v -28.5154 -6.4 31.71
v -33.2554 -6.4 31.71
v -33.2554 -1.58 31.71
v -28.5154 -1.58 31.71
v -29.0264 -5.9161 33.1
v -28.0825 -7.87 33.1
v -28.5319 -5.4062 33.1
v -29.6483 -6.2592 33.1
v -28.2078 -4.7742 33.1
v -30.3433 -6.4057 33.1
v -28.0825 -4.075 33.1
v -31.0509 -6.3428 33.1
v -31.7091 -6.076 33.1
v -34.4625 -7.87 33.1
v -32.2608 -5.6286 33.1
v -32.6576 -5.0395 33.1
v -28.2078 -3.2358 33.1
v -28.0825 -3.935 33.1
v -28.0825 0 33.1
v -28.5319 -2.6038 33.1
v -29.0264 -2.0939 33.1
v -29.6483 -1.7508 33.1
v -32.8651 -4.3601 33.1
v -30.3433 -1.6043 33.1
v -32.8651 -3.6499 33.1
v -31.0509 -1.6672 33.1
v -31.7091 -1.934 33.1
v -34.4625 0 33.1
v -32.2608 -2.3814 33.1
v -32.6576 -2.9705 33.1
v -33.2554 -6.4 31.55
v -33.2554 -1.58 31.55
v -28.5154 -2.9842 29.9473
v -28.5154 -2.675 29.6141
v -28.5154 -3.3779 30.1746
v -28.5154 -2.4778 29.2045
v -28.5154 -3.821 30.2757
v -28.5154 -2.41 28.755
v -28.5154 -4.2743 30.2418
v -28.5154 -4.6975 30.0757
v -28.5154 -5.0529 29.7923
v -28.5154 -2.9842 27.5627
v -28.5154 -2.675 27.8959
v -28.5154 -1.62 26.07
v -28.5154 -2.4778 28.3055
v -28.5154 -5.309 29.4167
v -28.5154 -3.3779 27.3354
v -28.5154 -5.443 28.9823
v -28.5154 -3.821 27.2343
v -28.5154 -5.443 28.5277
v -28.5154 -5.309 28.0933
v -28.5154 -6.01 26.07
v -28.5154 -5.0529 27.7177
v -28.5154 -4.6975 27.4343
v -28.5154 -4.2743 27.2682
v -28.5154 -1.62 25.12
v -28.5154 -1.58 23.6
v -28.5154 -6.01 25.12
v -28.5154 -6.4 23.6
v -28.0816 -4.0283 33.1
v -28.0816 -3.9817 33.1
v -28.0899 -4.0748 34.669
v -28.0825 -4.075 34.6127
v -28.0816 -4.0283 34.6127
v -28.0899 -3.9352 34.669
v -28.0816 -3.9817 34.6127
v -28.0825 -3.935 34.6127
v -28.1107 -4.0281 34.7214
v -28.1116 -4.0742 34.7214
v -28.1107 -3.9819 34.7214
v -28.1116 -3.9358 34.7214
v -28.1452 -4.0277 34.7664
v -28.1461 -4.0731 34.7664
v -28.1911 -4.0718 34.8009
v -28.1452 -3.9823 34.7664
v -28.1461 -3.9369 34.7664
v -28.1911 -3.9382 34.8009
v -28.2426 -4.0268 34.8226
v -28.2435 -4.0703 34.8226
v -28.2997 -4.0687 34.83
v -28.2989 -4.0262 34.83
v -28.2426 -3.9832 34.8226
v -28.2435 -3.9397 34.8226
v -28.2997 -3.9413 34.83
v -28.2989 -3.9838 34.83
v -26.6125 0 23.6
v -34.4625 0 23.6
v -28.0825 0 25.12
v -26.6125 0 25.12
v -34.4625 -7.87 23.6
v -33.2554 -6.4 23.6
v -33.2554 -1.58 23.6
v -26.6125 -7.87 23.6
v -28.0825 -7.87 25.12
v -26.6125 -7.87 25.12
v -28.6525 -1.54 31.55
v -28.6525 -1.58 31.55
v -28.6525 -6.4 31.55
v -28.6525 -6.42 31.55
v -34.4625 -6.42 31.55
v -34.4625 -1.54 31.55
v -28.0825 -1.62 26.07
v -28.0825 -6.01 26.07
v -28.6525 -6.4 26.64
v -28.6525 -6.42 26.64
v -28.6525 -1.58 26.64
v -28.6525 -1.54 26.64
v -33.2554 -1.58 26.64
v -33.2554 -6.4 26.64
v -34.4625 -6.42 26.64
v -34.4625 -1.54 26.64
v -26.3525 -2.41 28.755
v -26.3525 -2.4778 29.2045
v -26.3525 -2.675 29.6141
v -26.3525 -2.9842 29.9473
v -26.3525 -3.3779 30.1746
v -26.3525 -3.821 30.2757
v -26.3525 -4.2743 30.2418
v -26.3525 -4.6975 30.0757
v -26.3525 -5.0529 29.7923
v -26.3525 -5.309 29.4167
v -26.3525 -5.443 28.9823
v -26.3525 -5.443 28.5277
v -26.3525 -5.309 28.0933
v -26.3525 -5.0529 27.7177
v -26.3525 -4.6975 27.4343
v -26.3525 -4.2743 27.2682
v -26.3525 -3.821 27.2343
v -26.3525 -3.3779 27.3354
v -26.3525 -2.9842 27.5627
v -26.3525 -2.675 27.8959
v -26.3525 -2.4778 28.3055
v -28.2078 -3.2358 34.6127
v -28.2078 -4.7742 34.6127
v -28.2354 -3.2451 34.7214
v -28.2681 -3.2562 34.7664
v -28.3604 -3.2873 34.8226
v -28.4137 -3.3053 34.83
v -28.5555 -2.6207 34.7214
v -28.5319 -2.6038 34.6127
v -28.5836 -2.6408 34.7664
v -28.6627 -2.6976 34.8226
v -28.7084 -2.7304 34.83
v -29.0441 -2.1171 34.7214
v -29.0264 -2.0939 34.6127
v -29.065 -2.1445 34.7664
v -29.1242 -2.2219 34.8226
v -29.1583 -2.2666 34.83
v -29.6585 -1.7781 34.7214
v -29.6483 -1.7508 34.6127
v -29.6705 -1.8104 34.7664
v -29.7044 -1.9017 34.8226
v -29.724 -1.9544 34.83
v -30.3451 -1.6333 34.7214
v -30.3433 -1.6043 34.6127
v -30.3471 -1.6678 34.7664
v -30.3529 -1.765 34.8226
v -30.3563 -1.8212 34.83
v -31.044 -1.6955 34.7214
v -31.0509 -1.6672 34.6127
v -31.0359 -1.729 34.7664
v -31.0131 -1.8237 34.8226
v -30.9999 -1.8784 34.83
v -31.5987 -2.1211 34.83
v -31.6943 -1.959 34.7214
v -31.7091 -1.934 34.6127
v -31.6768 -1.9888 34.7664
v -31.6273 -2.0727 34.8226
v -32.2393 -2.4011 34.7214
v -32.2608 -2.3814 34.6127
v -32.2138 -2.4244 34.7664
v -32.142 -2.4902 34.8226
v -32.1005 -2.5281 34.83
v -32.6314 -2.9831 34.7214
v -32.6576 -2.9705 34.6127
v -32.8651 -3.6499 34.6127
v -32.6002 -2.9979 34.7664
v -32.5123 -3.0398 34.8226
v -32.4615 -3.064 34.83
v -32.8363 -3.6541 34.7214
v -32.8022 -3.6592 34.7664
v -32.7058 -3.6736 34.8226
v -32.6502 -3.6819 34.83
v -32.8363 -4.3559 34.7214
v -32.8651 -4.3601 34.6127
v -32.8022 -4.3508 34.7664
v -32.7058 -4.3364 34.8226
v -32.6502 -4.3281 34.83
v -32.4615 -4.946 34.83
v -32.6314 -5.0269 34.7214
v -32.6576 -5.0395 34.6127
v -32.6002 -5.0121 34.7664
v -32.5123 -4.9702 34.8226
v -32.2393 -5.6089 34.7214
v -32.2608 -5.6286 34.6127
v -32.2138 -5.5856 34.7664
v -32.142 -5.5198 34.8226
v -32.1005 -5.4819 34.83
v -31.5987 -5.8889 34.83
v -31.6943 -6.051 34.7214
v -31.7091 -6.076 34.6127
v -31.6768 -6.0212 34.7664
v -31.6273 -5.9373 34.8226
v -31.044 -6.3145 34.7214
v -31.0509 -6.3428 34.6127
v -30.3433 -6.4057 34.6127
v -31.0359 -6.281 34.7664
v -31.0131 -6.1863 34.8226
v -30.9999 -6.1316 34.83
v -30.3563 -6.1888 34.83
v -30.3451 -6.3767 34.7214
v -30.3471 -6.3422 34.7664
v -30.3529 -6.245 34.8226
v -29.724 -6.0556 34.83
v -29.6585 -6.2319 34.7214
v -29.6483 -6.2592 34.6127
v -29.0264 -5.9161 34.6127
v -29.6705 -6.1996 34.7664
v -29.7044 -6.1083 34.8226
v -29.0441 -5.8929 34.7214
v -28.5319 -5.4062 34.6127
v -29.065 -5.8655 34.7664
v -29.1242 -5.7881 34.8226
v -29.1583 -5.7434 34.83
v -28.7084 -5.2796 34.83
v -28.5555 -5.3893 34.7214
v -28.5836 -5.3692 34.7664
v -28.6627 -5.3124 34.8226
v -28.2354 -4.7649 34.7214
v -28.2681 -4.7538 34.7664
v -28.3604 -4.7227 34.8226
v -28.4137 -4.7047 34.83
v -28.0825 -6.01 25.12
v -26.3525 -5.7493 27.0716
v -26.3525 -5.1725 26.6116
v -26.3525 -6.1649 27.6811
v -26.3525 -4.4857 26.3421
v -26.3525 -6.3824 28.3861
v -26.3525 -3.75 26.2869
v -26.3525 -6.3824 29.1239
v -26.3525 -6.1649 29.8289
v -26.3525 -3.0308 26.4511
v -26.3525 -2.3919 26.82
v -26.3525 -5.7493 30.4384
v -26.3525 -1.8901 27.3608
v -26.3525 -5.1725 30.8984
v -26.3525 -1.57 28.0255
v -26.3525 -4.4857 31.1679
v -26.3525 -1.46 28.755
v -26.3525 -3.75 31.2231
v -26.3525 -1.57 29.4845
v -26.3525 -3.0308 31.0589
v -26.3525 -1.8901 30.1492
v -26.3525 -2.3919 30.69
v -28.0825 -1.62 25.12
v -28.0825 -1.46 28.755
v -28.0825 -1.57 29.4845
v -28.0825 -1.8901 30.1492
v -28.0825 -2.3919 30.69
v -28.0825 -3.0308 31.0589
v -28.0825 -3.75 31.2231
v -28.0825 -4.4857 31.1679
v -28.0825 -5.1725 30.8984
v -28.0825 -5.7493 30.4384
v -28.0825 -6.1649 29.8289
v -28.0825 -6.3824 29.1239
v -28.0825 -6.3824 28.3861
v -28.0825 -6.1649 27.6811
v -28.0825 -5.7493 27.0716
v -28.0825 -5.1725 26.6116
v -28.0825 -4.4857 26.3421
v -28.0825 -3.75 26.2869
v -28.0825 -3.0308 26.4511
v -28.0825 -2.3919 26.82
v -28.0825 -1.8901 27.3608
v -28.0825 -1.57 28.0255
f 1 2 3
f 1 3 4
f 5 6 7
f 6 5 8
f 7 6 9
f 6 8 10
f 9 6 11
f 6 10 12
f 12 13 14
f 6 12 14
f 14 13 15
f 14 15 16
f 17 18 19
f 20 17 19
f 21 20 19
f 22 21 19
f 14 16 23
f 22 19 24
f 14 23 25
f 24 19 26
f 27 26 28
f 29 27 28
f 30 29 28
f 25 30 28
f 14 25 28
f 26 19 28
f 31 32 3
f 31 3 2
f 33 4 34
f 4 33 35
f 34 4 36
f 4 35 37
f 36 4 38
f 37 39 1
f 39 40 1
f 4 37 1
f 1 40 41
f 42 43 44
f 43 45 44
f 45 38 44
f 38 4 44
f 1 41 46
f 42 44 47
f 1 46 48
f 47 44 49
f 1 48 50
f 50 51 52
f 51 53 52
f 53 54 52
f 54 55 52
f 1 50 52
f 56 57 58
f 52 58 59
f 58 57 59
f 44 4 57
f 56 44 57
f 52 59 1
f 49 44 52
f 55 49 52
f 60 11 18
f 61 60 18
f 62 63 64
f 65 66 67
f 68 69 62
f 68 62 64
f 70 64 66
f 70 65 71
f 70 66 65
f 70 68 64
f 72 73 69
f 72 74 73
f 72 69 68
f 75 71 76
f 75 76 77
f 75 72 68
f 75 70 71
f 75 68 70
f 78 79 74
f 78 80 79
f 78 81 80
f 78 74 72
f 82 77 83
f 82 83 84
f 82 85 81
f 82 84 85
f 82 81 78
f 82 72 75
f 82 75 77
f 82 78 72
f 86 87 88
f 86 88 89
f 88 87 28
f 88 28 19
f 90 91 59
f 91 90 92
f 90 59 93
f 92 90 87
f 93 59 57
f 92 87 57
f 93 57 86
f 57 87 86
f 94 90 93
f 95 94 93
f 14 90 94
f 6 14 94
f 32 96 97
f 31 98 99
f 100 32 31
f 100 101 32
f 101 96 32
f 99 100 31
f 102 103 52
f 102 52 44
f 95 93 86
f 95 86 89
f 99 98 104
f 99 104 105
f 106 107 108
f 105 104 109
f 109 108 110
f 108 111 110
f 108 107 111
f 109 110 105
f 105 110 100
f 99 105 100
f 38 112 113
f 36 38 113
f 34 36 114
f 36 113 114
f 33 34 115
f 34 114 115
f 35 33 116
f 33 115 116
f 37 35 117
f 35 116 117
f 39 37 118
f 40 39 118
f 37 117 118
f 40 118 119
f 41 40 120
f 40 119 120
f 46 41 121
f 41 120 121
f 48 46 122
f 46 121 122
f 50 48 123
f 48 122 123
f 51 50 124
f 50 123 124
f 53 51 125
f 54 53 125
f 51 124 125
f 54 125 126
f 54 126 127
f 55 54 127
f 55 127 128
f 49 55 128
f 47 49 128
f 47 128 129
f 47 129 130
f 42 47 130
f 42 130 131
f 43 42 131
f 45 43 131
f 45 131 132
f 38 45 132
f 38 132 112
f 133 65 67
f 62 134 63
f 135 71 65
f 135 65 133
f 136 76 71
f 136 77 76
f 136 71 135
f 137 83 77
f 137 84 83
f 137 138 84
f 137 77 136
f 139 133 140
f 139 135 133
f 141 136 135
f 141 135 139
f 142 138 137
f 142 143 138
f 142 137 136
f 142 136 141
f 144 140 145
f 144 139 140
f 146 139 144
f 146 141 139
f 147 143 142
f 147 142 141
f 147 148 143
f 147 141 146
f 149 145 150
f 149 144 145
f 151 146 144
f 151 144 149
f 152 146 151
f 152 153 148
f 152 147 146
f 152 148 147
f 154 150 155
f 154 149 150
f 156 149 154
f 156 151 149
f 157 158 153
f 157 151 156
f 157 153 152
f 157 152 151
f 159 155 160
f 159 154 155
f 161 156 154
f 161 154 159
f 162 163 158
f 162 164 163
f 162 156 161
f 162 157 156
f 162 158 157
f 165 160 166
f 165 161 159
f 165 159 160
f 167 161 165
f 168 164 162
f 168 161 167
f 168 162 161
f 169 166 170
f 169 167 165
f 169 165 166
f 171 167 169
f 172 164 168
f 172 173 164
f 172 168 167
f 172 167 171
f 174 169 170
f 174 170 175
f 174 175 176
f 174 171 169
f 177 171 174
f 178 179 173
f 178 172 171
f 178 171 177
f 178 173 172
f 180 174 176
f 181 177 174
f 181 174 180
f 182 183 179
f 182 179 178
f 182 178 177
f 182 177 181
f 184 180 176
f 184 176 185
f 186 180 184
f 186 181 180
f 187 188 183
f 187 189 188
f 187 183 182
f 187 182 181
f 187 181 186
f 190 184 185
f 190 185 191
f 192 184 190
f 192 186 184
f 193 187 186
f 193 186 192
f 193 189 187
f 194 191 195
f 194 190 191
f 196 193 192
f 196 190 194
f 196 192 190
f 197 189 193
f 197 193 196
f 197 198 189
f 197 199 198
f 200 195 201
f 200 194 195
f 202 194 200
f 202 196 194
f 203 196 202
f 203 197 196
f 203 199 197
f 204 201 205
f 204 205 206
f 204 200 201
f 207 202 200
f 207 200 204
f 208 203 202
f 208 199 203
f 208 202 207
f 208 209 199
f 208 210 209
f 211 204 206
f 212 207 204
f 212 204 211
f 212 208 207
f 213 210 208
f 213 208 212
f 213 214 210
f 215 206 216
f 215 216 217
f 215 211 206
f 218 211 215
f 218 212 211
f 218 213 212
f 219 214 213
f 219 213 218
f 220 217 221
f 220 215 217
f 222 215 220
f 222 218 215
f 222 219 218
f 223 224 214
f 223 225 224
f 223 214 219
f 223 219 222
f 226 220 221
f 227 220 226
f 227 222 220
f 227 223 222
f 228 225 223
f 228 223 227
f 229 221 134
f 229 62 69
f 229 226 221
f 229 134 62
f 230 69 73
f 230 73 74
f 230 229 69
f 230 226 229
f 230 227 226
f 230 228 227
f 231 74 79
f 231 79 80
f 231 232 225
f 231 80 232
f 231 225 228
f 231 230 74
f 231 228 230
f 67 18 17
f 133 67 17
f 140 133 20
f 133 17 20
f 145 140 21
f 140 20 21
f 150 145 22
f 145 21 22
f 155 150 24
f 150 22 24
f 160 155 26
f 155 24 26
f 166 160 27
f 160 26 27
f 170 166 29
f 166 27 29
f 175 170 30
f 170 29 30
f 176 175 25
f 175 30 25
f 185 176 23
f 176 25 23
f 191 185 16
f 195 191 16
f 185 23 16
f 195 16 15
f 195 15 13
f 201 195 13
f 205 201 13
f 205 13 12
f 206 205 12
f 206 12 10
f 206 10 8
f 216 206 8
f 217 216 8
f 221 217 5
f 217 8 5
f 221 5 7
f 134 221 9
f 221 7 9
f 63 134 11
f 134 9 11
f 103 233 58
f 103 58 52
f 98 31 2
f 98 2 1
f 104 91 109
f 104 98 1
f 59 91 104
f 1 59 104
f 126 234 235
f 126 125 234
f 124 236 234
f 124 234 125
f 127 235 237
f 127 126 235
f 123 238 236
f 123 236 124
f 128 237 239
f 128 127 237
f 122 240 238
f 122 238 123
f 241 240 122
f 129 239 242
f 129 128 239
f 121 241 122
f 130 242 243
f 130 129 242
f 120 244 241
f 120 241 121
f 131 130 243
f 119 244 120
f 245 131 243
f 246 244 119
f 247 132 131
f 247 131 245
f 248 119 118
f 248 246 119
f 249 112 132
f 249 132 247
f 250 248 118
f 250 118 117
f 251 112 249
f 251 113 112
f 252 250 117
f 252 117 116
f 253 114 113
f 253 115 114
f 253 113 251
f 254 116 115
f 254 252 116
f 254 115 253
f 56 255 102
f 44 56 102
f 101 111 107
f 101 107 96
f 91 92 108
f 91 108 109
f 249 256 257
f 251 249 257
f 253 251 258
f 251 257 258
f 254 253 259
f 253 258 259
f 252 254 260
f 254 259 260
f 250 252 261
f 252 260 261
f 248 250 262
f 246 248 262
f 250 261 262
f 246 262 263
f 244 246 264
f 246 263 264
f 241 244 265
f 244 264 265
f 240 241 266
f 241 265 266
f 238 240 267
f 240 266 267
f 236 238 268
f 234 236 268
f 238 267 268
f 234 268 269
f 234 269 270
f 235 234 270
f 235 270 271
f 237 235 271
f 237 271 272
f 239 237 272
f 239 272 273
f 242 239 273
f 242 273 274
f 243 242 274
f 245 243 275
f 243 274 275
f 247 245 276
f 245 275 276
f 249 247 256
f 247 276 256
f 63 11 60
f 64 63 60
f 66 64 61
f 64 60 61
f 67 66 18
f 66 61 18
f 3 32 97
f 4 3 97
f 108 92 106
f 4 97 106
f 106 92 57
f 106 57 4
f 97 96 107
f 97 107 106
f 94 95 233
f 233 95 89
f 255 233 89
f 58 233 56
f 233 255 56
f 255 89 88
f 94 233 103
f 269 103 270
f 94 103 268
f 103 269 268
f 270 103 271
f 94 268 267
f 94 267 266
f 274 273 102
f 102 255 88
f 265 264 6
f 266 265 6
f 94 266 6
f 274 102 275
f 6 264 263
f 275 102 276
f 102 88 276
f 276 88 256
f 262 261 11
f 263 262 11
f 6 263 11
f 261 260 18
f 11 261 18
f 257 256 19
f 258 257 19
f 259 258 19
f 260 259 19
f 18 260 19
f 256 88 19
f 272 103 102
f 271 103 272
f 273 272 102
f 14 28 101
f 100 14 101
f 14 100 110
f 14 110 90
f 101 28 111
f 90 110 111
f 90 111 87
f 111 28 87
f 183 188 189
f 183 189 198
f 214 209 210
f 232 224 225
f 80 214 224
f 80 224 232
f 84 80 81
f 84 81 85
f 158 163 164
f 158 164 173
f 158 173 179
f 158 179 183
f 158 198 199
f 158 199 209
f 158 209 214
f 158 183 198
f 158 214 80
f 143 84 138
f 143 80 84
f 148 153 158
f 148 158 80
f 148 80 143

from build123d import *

# Parameters (mm, degrees)
F1_DEPTH  = 7.87
F2_W      = 4.88
F2_H      = 4.91
F3_DEPTH  = 5.81
F4_W      = 4.39
F4_H      = 0.95
F5_DEPTH  = 1.95
F6_W      = 4.74
F6_H      = 4.82
F7_DEPTH  = 8.11
F8_R      = 2.475
F9_DEPTH  = 1.73
F10_R     = 1.525
F11_DEPTH = 25
F12_R     = 2.405
F13_DEPTH = 1.73
F14_R     = 0.217279


with BuildPart() as f1:
    # F0 (on Front) → F1 (new body)
    with BuildSketch(Plane.XZ):
        Polygon((-28.082503, 33.1), (-34.462503, 33.1), (-34.462503, 23.6), (-26.612503, 23.6), (-26.612503, 25.12), (-28.082503, 25.12), align=None)
    extrude(amount=F1_DEPTH)

    # F2 (on face) → F3 (cut)
    with BuildSketch(Plane(origin=(-34.462503, 0, 0), x_dir=(0, -1, 0), z_dir=(-1, 0, 0))):
        with Locations((3.98, 29.095)):
            Rectangle(F2_W, F2_H)
    extrude(amount=-F3_DEPTH, mode=Mode.SUBTRACT)

    # F4 (on face) → F5 (cut)
    with BuildSketch(Plane.YZ.offset(-28.082503)):
        with Locations((-3.815, 25.595)):
            Rectangle(F4_W, F4_H)
    extrude(amount=-F5_DEPTH, mode=Mode.SUBTRACT)

    # F6 (on face) → F7 (cut)
    with BuildSketch(Plane(origin=(0, 0, 23.6), x_dir=(1, 0, 0), z_dir=(0, 0, -1))):
        with Locations((-30.885357, 3.99)):
            Rectangle(F6_W, F6_H)
    extrude(amount=-F7_DEPTH, mode=Mode.SUBTRACT)

    # F8 (on face) → F9 (join)
    with BuildSketch(Plane.YZ.offset(-28.082503)):
        with Locations((-3.935, 28.755)):
            Circle(F8_R)
    extrude(amount=F9_DEPTH)

    # F10 (on face) → F11 (cut)
    with BuildSketch(Plane.YZ.offset(-26.352503)):
        with Locations((-3.935, 28.755)):
            Circle(F10_R)
    extrude(amount=-F11_DEPTH, mode=Mode.SUBTRACT)

    # F12 (on face) → F13 (join)
    with BuildSketch(Plane.XY.offset(33.1)):
        with Locations((-30.486484, -4.005)):
            Circle(F12_R)
        with BuildLine():
            Line((-28.082503, -4.075), (-28.082503, -3.935))
            ThreePointArc((-28.082503, -3.935), (-32.891484, -4.005), (-28.082503, -4.075))
        make_face()
    extrude(amount=F13_DEPTH)

    # F14
    f14_edges = [f1.edges().sort_by_distance(p)[0] for p in [
        (-32.891484, -4.005, 34.83),
    ]]
    fillet(f14_edges, radius=F14_R)


solid = f1.part
